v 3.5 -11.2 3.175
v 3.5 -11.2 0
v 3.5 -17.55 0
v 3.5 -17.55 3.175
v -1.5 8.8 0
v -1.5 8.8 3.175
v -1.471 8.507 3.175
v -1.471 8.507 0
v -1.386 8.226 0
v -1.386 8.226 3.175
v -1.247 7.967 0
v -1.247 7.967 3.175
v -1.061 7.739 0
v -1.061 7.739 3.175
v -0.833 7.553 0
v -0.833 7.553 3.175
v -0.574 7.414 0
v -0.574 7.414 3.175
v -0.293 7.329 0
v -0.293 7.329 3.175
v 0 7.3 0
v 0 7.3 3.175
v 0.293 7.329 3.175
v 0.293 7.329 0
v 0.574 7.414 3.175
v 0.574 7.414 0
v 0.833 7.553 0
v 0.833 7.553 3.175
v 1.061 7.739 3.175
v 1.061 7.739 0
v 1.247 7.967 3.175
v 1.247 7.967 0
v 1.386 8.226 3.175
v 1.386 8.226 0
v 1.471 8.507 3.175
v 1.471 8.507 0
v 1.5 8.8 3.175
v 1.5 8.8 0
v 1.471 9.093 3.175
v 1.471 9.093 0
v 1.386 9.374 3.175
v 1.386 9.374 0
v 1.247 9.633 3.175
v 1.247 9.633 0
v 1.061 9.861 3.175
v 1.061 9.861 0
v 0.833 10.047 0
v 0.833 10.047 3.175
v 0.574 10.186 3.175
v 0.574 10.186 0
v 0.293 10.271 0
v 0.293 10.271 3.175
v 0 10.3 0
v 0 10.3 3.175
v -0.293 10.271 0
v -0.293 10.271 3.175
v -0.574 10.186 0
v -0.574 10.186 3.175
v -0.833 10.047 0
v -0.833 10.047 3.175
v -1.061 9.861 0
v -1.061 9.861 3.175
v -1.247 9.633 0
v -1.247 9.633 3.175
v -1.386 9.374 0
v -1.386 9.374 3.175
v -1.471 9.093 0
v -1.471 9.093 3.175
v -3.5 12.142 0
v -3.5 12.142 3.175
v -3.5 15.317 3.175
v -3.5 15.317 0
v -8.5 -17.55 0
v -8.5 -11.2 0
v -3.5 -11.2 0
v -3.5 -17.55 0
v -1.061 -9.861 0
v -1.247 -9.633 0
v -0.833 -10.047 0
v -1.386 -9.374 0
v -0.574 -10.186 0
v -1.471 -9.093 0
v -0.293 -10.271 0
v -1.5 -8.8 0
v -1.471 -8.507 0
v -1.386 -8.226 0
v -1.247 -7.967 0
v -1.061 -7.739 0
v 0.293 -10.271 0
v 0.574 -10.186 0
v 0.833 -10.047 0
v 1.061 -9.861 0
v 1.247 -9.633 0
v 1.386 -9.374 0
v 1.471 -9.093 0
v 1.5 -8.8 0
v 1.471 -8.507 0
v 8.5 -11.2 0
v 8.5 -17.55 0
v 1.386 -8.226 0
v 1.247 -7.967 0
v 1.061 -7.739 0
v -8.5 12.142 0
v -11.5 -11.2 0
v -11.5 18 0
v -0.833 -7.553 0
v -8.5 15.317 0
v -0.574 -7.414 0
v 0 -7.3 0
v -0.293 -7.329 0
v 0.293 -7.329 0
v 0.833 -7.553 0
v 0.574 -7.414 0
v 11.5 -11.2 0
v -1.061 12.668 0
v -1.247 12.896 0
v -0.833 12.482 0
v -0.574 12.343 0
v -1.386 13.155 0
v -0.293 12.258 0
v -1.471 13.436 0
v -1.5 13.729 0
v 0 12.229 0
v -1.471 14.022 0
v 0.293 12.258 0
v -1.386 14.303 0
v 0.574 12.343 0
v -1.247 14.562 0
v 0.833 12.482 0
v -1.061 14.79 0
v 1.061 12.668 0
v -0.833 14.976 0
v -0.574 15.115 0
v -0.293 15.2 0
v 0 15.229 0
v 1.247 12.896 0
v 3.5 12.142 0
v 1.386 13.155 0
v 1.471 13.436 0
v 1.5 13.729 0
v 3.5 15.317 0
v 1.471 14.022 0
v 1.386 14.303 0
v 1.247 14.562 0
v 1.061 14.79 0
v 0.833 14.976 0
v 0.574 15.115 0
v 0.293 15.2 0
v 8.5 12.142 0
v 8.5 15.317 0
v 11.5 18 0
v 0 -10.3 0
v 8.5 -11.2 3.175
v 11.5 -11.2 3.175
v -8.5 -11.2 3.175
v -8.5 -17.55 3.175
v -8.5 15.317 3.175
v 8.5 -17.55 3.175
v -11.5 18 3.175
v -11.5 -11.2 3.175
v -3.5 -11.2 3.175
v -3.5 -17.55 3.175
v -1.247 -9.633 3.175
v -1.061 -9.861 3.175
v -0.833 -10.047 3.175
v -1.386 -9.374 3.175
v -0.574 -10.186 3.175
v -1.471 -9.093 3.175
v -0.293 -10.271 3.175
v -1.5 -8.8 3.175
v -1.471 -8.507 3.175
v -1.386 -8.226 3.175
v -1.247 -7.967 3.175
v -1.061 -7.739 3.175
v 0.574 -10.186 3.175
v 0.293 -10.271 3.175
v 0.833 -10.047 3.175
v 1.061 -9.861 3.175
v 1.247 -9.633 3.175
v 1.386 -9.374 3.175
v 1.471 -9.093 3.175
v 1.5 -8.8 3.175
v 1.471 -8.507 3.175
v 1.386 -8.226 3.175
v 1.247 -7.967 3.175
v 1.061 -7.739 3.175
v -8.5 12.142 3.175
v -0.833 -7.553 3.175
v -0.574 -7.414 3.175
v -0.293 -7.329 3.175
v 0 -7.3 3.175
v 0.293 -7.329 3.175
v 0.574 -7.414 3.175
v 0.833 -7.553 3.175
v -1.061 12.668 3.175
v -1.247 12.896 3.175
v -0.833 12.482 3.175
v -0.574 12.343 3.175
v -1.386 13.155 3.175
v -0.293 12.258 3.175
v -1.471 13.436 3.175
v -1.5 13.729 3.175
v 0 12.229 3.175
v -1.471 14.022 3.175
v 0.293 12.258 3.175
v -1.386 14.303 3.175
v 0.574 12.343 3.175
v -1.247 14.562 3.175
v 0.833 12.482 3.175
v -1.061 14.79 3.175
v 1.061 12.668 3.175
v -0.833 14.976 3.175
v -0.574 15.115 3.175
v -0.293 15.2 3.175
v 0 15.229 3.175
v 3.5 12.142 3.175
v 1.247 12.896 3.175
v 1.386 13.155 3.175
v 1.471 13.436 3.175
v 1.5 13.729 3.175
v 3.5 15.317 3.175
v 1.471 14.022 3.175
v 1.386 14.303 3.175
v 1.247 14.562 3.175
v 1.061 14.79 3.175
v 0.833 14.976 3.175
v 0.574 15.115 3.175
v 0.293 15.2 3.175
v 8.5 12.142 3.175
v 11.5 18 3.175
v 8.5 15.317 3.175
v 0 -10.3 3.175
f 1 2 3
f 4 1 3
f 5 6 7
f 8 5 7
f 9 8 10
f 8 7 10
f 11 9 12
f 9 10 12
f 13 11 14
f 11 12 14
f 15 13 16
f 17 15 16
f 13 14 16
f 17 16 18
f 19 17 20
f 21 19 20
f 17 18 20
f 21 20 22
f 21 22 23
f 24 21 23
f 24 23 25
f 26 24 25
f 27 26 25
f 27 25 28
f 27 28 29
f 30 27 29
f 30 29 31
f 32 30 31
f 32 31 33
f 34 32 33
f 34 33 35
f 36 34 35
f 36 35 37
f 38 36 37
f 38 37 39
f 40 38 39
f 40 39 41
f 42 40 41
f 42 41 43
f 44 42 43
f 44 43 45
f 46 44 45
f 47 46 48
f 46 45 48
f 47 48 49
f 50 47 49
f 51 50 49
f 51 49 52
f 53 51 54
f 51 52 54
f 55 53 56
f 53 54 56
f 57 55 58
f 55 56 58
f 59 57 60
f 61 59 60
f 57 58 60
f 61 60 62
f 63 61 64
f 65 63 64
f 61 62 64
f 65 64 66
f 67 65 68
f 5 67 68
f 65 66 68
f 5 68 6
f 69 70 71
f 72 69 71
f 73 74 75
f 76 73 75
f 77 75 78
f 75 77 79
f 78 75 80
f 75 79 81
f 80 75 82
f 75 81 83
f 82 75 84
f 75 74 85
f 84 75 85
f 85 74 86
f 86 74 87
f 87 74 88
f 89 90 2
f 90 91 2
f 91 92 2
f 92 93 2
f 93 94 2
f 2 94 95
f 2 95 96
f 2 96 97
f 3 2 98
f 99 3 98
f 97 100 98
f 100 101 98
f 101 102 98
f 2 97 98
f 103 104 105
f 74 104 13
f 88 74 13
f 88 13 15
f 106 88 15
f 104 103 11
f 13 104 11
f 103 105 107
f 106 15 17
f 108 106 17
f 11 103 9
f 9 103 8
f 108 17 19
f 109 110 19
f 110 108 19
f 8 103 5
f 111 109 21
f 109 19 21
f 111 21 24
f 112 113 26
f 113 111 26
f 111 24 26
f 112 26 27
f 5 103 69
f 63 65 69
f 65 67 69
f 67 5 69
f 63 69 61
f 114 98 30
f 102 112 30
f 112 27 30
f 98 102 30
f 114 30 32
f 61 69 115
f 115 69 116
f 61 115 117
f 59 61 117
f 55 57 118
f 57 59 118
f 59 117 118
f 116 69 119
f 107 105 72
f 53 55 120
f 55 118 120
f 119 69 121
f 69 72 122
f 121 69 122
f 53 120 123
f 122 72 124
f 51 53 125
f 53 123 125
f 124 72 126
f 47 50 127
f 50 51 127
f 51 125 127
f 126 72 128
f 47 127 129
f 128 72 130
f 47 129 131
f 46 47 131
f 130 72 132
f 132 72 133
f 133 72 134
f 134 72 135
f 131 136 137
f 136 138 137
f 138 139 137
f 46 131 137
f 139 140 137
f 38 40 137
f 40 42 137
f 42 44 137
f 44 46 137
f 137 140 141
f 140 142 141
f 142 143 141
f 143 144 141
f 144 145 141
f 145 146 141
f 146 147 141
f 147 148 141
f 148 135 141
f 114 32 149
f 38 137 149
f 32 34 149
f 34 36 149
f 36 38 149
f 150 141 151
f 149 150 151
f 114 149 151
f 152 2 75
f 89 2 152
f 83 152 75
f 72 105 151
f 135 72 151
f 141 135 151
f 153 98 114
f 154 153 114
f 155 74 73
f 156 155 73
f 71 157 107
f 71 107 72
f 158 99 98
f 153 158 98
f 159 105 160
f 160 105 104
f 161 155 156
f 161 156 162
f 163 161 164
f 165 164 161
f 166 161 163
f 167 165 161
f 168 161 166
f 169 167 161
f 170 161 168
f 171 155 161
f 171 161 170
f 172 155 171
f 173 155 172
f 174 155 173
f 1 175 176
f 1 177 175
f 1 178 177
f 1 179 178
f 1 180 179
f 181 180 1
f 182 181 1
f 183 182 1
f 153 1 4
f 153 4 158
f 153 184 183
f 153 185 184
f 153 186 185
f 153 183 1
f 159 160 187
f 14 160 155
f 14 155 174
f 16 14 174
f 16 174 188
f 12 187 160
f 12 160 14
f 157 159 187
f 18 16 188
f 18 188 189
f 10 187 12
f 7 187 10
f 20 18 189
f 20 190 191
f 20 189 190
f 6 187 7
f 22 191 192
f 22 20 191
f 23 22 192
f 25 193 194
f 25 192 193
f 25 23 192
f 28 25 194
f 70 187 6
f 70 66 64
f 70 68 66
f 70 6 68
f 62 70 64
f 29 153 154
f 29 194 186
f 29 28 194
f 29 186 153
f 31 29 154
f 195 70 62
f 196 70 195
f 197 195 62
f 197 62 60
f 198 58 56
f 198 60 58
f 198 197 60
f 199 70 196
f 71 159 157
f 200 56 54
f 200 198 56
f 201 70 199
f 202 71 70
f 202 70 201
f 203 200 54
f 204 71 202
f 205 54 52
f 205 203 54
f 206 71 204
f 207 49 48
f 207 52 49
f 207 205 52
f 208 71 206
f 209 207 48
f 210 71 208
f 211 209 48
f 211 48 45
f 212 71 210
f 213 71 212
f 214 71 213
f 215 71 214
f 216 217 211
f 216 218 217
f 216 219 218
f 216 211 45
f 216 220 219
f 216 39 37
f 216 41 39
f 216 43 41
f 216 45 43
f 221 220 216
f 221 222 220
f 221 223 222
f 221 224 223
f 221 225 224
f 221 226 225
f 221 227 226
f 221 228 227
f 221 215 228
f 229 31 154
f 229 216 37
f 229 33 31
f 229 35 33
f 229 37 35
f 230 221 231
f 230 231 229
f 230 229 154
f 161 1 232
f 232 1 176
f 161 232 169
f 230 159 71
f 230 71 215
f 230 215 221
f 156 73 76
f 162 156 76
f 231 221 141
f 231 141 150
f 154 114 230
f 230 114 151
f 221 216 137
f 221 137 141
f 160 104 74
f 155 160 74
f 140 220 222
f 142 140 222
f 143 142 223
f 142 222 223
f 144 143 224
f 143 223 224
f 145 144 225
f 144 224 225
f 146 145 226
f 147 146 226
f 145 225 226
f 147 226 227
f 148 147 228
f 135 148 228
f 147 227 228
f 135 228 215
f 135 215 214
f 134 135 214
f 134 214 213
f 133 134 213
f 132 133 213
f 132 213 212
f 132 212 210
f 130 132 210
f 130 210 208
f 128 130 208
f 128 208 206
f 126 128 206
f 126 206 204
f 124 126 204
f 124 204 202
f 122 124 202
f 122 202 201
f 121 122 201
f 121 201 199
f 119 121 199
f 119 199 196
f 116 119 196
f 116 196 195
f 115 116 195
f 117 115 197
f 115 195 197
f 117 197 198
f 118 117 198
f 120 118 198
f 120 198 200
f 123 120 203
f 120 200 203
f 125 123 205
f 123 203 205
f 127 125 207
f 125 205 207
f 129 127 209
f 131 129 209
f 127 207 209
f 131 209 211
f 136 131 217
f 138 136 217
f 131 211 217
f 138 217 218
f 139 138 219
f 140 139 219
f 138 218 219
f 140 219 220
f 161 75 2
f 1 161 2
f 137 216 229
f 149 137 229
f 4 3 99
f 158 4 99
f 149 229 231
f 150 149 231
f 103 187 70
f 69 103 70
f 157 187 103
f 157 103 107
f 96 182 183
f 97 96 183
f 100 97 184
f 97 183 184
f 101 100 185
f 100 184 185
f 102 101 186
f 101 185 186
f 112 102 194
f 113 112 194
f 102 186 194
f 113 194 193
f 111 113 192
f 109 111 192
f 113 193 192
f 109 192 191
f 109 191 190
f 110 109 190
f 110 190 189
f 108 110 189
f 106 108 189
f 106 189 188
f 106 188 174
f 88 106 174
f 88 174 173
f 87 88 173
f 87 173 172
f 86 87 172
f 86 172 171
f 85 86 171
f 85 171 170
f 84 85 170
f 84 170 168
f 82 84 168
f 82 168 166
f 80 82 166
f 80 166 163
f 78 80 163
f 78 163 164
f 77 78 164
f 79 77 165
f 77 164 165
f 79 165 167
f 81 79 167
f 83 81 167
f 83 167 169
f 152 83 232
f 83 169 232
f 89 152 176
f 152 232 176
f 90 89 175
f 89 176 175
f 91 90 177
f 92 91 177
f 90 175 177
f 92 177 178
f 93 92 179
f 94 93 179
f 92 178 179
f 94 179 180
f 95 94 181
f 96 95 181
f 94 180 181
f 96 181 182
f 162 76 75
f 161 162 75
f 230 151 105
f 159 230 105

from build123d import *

# Parameters (mm, degrees)
BOSS_EXTRUDE1_DEPTH = 3.175
SKETCH2_R           = 1.5
CUT_EXTRUDE1_DEPTH  = 22.594689741
SKETCH3_R           = 1.5
SKETCH3_W           = 5
SKETCH3_H           = 3.175
CUT_EXTRUDE2_DEPTH  = 22.594689741


with BuildPart() as part:
    # Sketch1 → Boss-Extrude1 (new body)
    with BuildSketch(Plane.XY):
        Polygon((-11.5, 0), (-11.5, -11.2), (-8.5, -11.2), (-8.5, -17.55), (-3.5, -17.55), (-3.5, -11.2), (3.5, -11.2), (3.5, -17.55), (8.5, -17.55), (8.5, -11.2), (11.5, -11.2), (11.5, 0), (11.5, 18), (-11.5, 18), align=None)
    extrude(amount=BOSS_EXTRUDE1_DEPTH)

    # Sketch2 → Cut-Extrude1 (cut, through all)
    with BuildSketch(Plane.XY.offset(3.175)):
        with Locations((0, -8.8)):
            Circle(SKETCH2_R)
        with Locations(Location((0, 8.8, 0), (0, 0, 180))):
            Circle(SKETCH2_R)
    extrude(amount=-CUT_EXTRUDE1_DEPTH, mode=Mode.SUBTRACT)

    # Sketch3 → Cut-Extrude2 (cut, through all)
    with BuildSketch(Plane.XY.offset(3.175)):
        with Locations((0, 13.72908257)):
            Circle(SKETCH3_R)
        with Locations((6, 13.72908257)):
            Rectangle(SKETCH3_W, SKETCH3_H)
        with Locations((-6, 13.72908257)):
            Rectangle(SKETCH3_W, SKETCH3_H)
    extrude(amount=-CUT_EXTRUDE2_DEPTH, mode=Mode.SUBTRACT)


solid = part.part
